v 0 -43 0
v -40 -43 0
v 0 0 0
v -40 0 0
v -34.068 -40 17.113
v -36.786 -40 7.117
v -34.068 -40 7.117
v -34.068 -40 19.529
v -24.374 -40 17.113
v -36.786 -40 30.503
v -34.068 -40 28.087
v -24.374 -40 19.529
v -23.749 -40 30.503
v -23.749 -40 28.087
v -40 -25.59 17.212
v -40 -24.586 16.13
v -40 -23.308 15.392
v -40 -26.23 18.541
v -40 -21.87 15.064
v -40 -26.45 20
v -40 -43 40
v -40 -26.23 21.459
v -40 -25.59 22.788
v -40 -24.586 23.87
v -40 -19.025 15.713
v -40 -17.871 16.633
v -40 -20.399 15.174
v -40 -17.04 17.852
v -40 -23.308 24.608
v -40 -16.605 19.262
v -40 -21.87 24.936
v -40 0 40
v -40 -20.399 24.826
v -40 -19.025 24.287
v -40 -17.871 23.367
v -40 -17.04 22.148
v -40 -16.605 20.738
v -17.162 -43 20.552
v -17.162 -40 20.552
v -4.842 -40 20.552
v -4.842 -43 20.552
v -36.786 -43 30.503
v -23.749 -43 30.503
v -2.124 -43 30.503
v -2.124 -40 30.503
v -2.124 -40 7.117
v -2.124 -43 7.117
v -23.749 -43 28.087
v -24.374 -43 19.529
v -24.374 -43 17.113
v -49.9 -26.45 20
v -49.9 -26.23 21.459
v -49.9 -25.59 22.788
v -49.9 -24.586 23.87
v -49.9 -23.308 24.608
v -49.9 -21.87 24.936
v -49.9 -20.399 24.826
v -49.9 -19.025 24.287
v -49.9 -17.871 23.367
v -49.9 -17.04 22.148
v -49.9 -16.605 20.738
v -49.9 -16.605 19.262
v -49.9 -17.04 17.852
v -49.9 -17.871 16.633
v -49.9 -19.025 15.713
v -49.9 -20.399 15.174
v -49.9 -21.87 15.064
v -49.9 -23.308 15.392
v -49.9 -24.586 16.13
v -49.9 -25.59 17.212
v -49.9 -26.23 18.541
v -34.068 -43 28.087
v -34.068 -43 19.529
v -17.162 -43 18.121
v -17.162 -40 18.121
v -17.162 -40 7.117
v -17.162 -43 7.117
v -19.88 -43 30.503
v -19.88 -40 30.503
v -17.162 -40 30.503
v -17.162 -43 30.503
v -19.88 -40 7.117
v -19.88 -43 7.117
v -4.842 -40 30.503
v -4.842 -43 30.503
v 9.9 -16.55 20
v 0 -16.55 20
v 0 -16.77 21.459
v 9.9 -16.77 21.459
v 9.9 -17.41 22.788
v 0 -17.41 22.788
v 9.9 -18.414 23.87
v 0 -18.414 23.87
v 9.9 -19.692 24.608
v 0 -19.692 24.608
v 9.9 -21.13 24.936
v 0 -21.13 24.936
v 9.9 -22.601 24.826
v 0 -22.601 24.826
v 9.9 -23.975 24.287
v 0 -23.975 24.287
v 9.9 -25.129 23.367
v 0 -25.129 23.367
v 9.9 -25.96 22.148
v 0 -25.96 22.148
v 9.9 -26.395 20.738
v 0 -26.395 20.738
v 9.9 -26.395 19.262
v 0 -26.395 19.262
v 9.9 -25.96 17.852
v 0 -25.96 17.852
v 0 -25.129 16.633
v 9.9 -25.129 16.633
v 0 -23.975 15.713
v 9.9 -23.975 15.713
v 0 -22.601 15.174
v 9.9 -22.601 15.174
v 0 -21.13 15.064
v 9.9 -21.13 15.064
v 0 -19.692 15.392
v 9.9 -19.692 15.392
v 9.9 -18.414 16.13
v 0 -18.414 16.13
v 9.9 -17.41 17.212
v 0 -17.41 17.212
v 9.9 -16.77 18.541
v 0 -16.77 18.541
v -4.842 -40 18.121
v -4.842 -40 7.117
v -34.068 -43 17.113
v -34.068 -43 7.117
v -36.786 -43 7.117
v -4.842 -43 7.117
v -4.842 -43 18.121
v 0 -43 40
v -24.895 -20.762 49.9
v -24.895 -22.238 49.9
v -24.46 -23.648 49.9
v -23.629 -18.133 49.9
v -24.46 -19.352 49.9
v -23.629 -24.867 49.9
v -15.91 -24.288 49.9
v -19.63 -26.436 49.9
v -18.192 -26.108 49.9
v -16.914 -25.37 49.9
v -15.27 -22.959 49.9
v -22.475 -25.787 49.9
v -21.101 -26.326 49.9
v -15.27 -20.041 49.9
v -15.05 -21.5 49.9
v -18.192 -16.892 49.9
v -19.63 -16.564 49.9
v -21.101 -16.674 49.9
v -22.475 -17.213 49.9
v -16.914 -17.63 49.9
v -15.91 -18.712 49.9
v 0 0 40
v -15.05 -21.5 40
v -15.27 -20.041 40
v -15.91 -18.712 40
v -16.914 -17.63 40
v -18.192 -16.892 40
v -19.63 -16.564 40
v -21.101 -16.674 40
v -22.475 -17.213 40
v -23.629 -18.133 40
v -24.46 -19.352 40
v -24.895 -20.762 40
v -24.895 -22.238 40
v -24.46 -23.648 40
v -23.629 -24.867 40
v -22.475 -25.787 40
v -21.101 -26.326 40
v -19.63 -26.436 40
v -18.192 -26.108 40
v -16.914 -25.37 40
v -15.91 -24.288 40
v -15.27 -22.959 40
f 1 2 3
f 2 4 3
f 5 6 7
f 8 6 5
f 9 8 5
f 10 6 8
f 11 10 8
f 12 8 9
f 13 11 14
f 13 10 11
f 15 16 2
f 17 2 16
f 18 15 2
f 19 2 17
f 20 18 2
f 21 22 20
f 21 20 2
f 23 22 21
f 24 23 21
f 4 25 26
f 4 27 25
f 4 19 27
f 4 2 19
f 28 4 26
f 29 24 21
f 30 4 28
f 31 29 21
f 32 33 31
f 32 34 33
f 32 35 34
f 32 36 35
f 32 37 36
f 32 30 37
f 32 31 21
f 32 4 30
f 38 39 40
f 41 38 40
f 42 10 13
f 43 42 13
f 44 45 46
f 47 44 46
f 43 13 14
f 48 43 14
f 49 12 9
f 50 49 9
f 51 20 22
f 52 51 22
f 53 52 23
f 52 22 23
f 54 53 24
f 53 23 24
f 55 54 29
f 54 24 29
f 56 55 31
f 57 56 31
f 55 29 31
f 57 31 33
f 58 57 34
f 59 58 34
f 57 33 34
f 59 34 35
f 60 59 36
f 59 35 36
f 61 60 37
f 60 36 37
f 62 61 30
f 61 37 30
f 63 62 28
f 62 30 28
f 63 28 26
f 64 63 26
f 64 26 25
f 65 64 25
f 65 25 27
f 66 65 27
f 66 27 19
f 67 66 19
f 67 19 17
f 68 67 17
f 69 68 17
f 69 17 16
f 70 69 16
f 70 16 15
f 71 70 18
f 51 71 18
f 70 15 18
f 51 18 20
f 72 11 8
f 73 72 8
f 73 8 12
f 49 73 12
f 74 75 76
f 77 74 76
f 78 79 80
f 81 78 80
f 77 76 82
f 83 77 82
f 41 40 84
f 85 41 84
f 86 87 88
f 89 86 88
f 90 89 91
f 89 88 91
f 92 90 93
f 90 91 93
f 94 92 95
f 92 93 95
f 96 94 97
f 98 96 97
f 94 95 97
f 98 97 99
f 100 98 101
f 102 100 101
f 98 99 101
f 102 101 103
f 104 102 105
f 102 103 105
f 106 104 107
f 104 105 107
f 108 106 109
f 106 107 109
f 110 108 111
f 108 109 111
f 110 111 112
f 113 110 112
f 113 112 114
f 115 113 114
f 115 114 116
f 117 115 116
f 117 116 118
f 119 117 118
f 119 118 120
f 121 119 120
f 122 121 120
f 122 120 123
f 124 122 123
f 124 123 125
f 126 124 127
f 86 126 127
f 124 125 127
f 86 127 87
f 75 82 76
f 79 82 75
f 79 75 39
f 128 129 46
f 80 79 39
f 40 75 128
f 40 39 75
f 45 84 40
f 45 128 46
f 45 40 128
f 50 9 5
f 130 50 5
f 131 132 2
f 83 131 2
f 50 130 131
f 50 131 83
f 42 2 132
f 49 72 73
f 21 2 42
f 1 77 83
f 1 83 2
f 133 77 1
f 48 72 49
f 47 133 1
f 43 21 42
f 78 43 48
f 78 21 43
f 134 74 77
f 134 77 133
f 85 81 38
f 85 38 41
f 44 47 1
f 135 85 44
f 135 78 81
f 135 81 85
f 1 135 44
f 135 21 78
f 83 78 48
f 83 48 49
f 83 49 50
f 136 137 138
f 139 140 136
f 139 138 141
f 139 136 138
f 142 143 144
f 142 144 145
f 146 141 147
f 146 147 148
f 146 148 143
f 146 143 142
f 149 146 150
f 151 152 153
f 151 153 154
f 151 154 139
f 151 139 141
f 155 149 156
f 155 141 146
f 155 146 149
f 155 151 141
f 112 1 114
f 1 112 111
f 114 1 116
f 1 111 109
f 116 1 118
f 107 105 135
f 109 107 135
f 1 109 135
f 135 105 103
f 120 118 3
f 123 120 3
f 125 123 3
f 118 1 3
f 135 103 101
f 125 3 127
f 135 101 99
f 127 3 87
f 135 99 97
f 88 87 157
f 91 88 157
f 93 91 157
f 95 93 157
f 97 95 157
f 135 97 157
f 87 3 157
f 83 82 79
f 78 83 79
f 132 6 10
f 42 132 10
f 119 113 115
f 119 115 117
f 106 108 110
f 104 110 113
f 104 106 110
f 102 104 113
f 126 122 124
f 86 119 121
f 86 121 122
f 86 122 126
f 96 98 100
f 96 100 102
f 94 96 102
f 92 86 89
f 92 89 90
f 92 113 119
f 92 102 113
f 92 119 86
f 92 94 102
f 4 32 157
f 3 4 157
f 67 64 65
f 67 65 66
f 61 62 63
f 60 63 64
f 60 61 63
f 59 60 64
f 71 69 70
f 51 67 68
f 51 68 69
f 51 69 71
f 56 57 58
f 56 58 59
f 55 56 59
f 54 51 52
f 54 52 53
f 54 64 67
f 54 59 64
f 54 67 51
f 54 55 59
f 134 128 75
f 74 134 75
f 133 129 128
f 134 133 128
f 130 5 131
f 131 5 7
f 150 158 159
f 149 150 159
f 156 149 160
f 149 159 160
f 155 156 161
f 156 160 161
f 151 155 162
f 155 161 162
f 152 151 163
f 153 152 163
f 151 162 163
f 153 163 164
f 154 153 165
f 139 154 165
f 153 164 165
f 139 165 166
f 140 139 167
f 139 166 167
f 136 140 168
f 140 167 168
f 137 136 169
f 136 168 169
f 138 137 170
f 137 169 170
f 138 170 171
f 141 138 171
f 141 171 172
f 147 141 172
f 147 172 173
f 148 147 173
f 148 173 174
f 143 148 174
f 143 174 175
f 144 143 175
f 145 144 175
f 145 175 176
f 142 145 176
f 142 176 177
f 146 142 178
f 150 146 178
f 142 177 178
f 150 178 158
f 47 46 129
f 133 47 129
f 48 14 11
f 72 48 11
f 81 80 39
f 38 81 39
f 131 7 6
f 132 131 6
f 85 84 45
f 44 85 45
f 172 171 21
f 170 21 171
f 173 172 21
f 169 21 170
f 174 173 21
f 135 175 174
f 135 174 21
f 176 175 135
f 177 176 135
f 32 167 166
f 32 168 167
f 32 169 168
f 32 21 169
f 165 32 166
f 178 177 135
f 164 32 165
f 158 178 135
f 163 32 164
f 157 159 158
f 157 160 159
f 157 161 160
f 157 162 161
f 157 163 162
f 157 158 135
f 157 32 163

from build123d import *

# Parameters (mm, degrees)
F0_W     = 40
F0_H     = 40
F1_DEPTH = 40
F2_W     = 40
F2_H     = 40
F3_DEPTH = 3
F4_R     = 4.95
F5_DEPTH = 9.9
F6_R     = 4.95
F7_DEPTH = 9.9
F8_R     = 4.95
F9_DEPTH = 9.9


with BuildPart() as f1:
    # F0 (on Front) → F1 (new body)
    with BuildSketch(Plane.XZ):
        with Locations((-20, 20)):
            Rectangle(F0_W, F0_H)
    extrude(amount=F1_DEPTH)

    # F2 (on face) → F3 (join)
    with BuildSketch(Plane.XZ.offset(40)):
        with Locations((-20, 20)):
            Rectangle(F2_W, F2_H)
        Polygon((-34.0678182981, 17.1128881329), (-34.0678182981, 7.1167269045), (-36.7856685861, 7.1167269045), (-36.7856685861, 30.5025234496), (-23.7492002559, 30.5025234496), (-23.7492002559, 28.086656527), (-34.0678182981, 28.086656527), (-34.0678182981, 19.5287550555), (-24.3736404351, 19.5287550555), (-24.3736404351, 17.1128881329), align=None, mode=Mode.SUBTRACT)
        Polygon((-2.1241202815, 30.5025234496), (-2.1241202815, 7.1167269045), (-4.8419705694, 7.1167269045), (-4.8419705694, 18.1212054714), (-17.1618682022, 18.1212054714), (-17.1618682022, 7.1167269045), (-19.8797184901, 7.1167269045), (-19.8797184901, 30.5025234496), (-17.1618682022, 30.5025234496), (-17.1618682022, 20.5524274803), (-4.8419705694, 20.5524274803), (-4.8419705694, 30.5025234496), align=None, mode=Mode.SUBTRACT)
    extrude(amount=F3_DEPTH)

    # F4 (on face) → F5 (join)
    with BuildSketch(Plane.XY.offset(40)):
        with Locations((-20, -21.5)):
            Circle(F4_R)
    extrude(amount=F5_DEPTH)

    # F6 (on face) → F7 (join)
    with BuildSketch(Plane(origin=(-40, 0, 0), x_dir=(0, -1, 0), z_dir=(-1, 0, 0))):
        with Locations((21.5, 20)):
            Circle(F6_R)
    extrude(amount=F7_DEPTH)

    # F8 (on face) → F9 (join)
    with BuildSketch(Plane.YZ):
        with Locations((-21.5, 20)):
            Circle(F8_R)
    extrude(amount=F9_DEPTH)


solid = f1.part
